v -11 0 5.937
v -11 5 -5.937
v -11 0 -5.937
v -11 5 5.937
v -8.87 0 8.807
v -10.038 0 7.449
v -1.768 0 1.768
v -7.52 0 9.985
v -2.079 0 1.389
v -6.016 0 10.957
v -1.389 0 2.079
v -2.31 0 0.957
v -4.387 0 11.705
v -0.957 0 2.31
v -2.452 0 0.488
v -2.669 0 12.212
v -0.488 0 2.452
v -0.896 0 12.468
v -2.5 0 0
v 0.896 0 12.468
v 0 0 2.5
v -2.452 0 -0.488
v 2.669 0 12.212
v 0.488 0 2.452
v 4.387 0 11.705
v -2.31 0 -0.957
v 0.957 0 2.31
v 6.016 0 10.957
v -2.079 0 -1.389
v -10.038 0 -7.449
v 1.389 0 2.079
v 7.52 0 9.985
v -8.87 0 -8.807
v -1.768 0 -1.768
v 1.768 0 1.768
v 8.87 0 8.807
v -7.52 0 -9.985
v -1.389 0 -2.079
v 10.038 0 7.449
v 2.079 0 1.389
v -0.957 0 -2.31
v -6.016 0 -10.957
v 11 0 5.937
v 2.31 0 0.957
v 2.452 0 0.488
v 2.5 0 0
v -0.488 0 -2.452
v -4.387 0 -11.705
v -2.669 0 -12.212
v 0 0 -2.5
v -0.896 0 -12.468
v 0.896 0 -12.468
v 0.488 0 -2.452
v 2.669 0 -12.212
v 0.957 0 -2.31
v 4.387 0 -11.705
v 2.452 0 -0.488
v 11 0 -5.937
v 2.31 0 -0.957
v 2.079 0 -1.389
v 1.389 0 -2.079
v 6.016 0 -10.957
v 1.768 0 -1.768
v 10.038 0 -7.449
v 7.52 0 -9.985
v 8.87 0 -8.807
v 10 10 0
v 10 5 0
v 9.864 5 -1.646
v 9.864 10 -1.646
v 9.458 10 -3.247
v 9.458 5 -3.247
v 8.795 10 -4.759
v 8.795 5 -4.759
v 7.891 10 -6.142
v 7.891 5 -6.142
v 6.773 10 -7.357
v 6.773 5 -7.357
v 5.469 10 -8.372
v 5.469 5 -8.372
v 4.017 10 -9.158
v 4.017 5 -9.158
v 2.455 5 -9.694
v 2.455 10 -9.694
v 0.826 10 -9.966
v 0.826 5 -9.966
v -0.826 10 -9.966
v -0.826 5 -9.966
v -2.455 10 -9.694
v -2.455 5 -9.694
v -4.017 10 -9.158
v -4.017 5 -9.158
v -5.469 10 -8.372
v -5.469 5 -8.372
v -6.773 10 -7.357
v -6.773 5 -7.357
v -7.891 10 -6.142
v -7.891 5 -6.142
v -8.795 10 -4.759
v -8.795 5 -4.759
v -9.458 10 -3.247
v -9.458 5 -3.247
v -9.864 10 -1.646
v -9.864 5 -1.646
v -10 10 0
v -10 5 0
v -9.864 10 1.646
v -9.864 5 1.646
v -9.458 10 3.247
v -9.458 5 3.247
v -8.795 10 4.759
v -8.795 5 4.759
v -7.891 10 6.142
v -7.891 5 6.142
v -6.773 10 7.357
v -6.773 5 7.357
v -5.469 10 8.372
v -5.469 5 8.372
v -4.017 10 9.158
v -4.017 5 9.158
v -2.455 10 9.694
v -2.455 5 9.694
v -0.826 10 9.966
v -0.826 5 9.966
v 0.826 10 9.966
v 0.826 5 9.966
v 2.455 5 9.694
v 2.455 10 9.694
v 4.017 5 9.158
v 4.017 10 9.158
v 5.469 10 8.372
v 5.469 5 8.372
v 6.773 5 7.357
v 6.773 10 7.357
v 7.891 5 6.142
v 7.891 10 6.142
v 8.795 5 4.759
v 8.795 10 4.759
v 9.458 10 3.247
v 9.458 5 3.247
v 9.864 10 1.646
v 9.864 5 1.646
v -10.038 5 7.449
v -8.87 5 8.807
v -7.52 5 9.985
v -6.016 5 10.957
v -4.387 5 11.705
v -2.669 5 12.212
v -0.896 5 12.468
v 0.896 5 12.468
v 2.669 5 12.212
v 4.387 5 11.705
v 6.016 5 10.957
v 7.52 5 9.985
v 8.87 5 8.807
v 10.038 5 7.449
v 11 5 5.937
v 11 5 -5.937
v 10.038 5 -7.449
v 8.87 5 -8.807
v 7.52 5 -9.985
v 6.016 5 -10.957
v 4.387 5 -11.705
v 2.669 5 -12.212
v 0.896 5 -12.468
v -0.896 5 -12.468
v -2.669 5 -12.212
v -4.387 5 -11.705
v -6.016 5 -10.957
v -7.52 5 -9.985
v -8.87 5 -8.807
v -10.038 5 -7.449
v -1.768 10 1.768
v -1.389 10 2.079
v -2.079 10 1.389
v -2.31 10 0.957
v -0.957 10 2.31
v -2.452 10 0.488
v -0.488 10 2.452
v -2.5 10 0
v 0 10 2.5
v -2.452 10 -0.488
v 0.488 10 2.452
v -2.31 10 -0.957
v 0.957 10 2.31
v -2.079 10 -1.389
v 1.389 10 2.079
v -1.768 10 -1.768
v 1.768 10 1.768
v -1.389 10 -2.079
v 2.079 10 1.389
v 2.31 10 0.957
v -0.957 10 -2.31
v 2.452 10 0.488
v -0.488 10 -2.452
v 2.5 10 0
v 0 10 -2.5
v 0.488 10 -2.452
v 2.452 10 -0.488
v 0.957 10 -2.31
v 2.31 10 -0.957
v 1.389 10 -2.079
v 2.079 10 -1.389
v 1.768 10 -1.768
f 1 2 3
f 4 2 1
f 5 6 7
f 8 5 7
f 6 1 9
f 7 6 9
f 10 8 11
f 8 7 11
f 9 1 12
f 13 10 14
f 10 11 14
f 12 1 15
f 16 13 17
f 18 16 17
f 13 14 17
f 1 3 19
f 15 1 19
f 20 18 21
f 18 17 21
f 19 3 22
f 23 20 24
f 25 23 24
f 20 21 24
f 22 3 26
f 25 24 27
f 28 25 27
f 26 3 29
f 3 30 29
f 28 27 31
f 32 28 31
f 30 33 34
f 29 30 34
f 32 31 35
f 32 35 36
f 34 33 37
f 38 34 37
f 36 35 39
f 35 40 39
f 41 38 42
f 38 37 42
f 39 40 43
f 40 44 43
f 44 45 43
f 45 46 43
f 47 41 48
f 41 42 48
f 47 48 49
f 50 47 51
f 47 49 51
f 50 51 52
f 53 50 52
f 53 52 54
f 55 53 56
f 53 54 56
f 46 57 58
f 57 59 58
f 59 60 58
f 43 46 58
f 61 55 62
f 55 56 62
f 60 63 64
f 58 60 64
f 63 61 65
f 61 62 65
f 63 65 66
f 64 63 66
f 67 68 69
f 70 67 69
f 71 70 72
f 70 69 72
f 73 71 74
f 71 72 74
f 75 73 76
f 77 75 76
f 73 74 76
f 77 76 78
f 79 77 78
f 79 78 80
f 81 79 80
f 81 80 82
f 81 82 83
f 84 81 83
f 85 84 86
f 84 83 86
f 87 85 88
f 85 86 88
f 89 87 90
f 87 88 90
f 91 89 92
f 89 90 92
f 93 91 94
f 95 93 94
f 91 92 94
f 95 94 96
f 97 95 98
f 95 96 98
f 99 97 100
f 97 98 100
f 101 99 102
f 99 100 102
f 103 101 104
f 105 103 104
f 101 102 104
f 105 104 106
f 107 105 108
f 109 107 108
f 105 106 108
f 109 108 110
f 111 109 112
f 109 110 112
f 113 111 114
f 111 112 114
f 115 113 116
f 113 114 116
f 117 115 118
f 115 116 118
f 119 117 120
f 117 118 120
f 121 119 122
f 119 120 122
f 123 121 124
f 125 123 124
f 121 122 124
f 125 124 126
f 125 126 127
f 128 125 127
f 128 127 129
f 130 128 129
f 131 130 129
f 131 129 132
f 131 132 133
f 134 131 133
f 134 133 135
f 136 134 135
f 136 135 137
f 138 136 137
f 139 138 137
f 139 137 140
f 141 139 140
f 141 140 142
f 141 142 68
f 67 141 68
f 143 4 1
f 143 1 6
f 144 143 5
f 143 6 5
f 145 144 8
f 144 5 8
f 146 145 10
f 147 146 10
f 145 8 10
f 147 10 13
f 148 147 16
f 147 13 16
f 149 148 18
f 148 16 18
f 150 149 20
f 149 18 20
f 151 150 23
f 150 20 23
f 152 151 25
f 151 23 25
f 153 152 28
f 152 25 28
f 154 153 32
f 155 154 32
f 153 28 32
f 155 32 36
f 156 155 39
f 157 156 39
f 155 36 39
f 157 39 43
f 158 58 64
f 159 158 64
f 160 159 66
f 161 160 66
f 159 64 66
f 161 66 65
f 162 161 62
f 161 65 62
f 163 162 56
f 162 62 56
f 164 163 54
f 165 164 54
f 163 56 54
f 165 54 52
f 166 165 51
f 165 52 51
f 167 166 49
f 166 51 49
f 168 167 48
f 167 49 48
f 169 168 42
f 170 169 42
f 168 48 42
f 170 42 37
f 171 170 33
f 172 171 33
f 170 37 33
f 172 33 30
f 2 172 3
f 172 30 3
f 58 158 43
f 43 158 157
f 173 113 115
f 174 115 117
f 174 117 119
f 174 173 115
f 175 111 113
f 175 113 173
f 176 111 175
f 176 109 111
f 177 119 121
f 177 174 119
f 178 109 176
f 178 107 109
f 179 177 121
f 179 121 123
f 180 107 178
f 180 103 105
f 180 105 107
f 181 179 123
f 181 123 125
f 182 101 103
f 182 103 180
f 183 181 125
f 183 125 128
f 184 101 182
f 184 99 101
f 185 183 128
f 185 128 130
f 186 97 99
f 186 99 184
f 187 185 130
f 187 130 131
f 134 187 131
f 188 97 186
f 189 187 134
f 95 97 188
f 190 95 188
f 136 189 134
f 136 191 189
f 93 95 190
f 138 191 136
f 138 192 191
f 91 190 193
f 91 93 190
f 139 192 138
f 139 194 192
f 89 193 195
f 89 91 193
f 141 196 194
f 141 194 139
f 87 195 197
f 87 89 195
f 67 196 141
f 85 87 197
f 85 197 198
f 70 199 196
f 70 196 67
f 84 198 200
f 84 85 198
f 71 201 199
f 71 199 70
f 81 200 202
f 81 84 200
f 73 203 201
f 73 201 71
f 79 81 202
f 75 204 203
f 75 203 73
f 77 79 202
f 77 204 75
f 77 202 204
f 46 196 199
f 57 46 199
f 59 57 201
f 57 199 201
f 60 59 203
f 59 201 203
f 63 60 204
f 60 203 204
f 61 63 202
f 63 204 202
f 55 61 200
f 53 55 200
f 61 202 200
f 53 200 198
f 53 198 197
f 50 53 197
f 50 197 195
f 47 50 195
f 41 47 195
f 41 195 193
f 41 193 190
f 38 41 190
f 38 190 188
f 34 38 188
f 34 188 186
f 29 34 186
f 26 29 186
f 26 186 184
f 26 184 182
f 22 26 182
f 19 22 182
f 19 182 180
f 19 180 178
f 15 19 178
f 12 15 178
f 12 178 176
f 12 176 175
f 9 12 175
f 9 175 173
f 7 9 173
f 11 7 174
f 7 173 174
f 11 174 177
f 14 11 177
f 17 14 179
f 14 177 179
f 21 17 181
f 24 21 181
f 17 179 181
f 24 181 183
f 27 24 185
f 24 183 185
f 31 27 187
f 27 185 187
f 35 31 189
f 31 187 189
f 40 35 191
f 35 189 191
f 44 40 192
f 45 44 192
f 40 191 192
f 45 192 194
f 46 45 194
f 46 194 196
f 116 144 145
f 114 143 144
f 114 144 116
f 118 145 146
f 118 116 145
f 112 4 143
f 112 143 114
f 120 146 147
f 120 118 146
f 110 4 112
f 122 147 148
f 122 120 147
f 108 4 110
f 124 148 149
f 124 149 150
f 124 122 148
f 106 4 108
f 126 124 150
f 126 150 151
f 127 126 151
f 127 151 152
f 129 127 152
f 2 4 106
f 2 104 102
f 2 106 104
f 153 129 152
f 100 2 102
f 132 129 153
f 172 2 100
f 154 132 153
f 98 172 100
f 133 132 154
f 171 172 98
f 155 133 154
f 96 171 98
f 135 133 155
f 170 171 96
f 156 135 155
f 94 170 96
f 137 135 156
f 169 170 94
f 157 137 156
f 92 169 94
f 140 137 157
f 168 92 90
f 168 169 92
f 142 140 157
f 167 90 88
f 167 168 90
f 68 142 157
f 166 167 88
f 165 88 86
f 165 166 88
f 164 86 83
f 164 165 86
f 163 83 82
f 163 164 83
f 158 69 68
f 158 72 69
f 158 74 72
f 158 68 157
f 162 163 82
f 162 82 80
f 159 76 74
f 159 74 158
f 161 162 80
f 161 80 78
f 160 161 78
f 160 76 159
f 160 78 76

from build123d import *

# Parameters (mm, degrees)
SKIZZE1_R                       = 12.5
AUFSATZ_LINEAR_AUSTRAGEN1_DEPTH = 5
SKIZZE2_R                       = 10
AUFSATZ_LINEAR_AUSTRAGEN2_DEPTH = 5
SKIZZE3_R                       = 2.5
SCHNITT_LINEAR_AUSTRAGEN1_DEPTH = 11


with BuildPart() as part:
    # Skizze1 → Aufsatz-Linear austragen1 (new body)
    with BuildSketch(Plane(origin=(0, 0, 0), x_dir=(1, 0, 0), z_dir=(0, 1, 0))):
        Circle(SKIZZE1_R)
    extrude(amount=AUFSATZ_LINEAR_AUSTRAGEN1_DEPTH)

    # Skizze2 → Aufsatz-Linear austragen2 (add)
    with BuildSketch(Plane(origin=(0, 5, 0), x_dir=(1, 0, 0), z_dir=(0, 1, 0))):
        Circle(SKIZZE2_R)
    extrude(amount=AUFSATZ_LINEAR_AUSTRAGEN2_DEPTH)

    # Skizze3 → Schnitt-Linear austragen1 (cut, through all)
    with BuildSketch(Plane(origin=(0, 10, 0), x_dir=(1, 0, 0), z_dir=(0, 1, 0))):
        Circle(SKIZZE3_R)
        with BuildLine():
            Line((-11, 5.937171044), (-11, -5.937171044))
            ThreePointArc((-11, -5.937171044), (-12.5, 0), (-11, 5.937171044))
        make_face()
        with BuildLine():
            Line((11, 5.937171044), (11, -5.937171044))
            ThreePointArc((11, -5.937171044), (12.5, 0), (11, 5.937171044))
        make_face()
    extrude(amount=-SCHNITT_LINEAR_AUSTRAGEN1_DEPTH, mode=Mode.SUBTRACT)


solid = part.part
